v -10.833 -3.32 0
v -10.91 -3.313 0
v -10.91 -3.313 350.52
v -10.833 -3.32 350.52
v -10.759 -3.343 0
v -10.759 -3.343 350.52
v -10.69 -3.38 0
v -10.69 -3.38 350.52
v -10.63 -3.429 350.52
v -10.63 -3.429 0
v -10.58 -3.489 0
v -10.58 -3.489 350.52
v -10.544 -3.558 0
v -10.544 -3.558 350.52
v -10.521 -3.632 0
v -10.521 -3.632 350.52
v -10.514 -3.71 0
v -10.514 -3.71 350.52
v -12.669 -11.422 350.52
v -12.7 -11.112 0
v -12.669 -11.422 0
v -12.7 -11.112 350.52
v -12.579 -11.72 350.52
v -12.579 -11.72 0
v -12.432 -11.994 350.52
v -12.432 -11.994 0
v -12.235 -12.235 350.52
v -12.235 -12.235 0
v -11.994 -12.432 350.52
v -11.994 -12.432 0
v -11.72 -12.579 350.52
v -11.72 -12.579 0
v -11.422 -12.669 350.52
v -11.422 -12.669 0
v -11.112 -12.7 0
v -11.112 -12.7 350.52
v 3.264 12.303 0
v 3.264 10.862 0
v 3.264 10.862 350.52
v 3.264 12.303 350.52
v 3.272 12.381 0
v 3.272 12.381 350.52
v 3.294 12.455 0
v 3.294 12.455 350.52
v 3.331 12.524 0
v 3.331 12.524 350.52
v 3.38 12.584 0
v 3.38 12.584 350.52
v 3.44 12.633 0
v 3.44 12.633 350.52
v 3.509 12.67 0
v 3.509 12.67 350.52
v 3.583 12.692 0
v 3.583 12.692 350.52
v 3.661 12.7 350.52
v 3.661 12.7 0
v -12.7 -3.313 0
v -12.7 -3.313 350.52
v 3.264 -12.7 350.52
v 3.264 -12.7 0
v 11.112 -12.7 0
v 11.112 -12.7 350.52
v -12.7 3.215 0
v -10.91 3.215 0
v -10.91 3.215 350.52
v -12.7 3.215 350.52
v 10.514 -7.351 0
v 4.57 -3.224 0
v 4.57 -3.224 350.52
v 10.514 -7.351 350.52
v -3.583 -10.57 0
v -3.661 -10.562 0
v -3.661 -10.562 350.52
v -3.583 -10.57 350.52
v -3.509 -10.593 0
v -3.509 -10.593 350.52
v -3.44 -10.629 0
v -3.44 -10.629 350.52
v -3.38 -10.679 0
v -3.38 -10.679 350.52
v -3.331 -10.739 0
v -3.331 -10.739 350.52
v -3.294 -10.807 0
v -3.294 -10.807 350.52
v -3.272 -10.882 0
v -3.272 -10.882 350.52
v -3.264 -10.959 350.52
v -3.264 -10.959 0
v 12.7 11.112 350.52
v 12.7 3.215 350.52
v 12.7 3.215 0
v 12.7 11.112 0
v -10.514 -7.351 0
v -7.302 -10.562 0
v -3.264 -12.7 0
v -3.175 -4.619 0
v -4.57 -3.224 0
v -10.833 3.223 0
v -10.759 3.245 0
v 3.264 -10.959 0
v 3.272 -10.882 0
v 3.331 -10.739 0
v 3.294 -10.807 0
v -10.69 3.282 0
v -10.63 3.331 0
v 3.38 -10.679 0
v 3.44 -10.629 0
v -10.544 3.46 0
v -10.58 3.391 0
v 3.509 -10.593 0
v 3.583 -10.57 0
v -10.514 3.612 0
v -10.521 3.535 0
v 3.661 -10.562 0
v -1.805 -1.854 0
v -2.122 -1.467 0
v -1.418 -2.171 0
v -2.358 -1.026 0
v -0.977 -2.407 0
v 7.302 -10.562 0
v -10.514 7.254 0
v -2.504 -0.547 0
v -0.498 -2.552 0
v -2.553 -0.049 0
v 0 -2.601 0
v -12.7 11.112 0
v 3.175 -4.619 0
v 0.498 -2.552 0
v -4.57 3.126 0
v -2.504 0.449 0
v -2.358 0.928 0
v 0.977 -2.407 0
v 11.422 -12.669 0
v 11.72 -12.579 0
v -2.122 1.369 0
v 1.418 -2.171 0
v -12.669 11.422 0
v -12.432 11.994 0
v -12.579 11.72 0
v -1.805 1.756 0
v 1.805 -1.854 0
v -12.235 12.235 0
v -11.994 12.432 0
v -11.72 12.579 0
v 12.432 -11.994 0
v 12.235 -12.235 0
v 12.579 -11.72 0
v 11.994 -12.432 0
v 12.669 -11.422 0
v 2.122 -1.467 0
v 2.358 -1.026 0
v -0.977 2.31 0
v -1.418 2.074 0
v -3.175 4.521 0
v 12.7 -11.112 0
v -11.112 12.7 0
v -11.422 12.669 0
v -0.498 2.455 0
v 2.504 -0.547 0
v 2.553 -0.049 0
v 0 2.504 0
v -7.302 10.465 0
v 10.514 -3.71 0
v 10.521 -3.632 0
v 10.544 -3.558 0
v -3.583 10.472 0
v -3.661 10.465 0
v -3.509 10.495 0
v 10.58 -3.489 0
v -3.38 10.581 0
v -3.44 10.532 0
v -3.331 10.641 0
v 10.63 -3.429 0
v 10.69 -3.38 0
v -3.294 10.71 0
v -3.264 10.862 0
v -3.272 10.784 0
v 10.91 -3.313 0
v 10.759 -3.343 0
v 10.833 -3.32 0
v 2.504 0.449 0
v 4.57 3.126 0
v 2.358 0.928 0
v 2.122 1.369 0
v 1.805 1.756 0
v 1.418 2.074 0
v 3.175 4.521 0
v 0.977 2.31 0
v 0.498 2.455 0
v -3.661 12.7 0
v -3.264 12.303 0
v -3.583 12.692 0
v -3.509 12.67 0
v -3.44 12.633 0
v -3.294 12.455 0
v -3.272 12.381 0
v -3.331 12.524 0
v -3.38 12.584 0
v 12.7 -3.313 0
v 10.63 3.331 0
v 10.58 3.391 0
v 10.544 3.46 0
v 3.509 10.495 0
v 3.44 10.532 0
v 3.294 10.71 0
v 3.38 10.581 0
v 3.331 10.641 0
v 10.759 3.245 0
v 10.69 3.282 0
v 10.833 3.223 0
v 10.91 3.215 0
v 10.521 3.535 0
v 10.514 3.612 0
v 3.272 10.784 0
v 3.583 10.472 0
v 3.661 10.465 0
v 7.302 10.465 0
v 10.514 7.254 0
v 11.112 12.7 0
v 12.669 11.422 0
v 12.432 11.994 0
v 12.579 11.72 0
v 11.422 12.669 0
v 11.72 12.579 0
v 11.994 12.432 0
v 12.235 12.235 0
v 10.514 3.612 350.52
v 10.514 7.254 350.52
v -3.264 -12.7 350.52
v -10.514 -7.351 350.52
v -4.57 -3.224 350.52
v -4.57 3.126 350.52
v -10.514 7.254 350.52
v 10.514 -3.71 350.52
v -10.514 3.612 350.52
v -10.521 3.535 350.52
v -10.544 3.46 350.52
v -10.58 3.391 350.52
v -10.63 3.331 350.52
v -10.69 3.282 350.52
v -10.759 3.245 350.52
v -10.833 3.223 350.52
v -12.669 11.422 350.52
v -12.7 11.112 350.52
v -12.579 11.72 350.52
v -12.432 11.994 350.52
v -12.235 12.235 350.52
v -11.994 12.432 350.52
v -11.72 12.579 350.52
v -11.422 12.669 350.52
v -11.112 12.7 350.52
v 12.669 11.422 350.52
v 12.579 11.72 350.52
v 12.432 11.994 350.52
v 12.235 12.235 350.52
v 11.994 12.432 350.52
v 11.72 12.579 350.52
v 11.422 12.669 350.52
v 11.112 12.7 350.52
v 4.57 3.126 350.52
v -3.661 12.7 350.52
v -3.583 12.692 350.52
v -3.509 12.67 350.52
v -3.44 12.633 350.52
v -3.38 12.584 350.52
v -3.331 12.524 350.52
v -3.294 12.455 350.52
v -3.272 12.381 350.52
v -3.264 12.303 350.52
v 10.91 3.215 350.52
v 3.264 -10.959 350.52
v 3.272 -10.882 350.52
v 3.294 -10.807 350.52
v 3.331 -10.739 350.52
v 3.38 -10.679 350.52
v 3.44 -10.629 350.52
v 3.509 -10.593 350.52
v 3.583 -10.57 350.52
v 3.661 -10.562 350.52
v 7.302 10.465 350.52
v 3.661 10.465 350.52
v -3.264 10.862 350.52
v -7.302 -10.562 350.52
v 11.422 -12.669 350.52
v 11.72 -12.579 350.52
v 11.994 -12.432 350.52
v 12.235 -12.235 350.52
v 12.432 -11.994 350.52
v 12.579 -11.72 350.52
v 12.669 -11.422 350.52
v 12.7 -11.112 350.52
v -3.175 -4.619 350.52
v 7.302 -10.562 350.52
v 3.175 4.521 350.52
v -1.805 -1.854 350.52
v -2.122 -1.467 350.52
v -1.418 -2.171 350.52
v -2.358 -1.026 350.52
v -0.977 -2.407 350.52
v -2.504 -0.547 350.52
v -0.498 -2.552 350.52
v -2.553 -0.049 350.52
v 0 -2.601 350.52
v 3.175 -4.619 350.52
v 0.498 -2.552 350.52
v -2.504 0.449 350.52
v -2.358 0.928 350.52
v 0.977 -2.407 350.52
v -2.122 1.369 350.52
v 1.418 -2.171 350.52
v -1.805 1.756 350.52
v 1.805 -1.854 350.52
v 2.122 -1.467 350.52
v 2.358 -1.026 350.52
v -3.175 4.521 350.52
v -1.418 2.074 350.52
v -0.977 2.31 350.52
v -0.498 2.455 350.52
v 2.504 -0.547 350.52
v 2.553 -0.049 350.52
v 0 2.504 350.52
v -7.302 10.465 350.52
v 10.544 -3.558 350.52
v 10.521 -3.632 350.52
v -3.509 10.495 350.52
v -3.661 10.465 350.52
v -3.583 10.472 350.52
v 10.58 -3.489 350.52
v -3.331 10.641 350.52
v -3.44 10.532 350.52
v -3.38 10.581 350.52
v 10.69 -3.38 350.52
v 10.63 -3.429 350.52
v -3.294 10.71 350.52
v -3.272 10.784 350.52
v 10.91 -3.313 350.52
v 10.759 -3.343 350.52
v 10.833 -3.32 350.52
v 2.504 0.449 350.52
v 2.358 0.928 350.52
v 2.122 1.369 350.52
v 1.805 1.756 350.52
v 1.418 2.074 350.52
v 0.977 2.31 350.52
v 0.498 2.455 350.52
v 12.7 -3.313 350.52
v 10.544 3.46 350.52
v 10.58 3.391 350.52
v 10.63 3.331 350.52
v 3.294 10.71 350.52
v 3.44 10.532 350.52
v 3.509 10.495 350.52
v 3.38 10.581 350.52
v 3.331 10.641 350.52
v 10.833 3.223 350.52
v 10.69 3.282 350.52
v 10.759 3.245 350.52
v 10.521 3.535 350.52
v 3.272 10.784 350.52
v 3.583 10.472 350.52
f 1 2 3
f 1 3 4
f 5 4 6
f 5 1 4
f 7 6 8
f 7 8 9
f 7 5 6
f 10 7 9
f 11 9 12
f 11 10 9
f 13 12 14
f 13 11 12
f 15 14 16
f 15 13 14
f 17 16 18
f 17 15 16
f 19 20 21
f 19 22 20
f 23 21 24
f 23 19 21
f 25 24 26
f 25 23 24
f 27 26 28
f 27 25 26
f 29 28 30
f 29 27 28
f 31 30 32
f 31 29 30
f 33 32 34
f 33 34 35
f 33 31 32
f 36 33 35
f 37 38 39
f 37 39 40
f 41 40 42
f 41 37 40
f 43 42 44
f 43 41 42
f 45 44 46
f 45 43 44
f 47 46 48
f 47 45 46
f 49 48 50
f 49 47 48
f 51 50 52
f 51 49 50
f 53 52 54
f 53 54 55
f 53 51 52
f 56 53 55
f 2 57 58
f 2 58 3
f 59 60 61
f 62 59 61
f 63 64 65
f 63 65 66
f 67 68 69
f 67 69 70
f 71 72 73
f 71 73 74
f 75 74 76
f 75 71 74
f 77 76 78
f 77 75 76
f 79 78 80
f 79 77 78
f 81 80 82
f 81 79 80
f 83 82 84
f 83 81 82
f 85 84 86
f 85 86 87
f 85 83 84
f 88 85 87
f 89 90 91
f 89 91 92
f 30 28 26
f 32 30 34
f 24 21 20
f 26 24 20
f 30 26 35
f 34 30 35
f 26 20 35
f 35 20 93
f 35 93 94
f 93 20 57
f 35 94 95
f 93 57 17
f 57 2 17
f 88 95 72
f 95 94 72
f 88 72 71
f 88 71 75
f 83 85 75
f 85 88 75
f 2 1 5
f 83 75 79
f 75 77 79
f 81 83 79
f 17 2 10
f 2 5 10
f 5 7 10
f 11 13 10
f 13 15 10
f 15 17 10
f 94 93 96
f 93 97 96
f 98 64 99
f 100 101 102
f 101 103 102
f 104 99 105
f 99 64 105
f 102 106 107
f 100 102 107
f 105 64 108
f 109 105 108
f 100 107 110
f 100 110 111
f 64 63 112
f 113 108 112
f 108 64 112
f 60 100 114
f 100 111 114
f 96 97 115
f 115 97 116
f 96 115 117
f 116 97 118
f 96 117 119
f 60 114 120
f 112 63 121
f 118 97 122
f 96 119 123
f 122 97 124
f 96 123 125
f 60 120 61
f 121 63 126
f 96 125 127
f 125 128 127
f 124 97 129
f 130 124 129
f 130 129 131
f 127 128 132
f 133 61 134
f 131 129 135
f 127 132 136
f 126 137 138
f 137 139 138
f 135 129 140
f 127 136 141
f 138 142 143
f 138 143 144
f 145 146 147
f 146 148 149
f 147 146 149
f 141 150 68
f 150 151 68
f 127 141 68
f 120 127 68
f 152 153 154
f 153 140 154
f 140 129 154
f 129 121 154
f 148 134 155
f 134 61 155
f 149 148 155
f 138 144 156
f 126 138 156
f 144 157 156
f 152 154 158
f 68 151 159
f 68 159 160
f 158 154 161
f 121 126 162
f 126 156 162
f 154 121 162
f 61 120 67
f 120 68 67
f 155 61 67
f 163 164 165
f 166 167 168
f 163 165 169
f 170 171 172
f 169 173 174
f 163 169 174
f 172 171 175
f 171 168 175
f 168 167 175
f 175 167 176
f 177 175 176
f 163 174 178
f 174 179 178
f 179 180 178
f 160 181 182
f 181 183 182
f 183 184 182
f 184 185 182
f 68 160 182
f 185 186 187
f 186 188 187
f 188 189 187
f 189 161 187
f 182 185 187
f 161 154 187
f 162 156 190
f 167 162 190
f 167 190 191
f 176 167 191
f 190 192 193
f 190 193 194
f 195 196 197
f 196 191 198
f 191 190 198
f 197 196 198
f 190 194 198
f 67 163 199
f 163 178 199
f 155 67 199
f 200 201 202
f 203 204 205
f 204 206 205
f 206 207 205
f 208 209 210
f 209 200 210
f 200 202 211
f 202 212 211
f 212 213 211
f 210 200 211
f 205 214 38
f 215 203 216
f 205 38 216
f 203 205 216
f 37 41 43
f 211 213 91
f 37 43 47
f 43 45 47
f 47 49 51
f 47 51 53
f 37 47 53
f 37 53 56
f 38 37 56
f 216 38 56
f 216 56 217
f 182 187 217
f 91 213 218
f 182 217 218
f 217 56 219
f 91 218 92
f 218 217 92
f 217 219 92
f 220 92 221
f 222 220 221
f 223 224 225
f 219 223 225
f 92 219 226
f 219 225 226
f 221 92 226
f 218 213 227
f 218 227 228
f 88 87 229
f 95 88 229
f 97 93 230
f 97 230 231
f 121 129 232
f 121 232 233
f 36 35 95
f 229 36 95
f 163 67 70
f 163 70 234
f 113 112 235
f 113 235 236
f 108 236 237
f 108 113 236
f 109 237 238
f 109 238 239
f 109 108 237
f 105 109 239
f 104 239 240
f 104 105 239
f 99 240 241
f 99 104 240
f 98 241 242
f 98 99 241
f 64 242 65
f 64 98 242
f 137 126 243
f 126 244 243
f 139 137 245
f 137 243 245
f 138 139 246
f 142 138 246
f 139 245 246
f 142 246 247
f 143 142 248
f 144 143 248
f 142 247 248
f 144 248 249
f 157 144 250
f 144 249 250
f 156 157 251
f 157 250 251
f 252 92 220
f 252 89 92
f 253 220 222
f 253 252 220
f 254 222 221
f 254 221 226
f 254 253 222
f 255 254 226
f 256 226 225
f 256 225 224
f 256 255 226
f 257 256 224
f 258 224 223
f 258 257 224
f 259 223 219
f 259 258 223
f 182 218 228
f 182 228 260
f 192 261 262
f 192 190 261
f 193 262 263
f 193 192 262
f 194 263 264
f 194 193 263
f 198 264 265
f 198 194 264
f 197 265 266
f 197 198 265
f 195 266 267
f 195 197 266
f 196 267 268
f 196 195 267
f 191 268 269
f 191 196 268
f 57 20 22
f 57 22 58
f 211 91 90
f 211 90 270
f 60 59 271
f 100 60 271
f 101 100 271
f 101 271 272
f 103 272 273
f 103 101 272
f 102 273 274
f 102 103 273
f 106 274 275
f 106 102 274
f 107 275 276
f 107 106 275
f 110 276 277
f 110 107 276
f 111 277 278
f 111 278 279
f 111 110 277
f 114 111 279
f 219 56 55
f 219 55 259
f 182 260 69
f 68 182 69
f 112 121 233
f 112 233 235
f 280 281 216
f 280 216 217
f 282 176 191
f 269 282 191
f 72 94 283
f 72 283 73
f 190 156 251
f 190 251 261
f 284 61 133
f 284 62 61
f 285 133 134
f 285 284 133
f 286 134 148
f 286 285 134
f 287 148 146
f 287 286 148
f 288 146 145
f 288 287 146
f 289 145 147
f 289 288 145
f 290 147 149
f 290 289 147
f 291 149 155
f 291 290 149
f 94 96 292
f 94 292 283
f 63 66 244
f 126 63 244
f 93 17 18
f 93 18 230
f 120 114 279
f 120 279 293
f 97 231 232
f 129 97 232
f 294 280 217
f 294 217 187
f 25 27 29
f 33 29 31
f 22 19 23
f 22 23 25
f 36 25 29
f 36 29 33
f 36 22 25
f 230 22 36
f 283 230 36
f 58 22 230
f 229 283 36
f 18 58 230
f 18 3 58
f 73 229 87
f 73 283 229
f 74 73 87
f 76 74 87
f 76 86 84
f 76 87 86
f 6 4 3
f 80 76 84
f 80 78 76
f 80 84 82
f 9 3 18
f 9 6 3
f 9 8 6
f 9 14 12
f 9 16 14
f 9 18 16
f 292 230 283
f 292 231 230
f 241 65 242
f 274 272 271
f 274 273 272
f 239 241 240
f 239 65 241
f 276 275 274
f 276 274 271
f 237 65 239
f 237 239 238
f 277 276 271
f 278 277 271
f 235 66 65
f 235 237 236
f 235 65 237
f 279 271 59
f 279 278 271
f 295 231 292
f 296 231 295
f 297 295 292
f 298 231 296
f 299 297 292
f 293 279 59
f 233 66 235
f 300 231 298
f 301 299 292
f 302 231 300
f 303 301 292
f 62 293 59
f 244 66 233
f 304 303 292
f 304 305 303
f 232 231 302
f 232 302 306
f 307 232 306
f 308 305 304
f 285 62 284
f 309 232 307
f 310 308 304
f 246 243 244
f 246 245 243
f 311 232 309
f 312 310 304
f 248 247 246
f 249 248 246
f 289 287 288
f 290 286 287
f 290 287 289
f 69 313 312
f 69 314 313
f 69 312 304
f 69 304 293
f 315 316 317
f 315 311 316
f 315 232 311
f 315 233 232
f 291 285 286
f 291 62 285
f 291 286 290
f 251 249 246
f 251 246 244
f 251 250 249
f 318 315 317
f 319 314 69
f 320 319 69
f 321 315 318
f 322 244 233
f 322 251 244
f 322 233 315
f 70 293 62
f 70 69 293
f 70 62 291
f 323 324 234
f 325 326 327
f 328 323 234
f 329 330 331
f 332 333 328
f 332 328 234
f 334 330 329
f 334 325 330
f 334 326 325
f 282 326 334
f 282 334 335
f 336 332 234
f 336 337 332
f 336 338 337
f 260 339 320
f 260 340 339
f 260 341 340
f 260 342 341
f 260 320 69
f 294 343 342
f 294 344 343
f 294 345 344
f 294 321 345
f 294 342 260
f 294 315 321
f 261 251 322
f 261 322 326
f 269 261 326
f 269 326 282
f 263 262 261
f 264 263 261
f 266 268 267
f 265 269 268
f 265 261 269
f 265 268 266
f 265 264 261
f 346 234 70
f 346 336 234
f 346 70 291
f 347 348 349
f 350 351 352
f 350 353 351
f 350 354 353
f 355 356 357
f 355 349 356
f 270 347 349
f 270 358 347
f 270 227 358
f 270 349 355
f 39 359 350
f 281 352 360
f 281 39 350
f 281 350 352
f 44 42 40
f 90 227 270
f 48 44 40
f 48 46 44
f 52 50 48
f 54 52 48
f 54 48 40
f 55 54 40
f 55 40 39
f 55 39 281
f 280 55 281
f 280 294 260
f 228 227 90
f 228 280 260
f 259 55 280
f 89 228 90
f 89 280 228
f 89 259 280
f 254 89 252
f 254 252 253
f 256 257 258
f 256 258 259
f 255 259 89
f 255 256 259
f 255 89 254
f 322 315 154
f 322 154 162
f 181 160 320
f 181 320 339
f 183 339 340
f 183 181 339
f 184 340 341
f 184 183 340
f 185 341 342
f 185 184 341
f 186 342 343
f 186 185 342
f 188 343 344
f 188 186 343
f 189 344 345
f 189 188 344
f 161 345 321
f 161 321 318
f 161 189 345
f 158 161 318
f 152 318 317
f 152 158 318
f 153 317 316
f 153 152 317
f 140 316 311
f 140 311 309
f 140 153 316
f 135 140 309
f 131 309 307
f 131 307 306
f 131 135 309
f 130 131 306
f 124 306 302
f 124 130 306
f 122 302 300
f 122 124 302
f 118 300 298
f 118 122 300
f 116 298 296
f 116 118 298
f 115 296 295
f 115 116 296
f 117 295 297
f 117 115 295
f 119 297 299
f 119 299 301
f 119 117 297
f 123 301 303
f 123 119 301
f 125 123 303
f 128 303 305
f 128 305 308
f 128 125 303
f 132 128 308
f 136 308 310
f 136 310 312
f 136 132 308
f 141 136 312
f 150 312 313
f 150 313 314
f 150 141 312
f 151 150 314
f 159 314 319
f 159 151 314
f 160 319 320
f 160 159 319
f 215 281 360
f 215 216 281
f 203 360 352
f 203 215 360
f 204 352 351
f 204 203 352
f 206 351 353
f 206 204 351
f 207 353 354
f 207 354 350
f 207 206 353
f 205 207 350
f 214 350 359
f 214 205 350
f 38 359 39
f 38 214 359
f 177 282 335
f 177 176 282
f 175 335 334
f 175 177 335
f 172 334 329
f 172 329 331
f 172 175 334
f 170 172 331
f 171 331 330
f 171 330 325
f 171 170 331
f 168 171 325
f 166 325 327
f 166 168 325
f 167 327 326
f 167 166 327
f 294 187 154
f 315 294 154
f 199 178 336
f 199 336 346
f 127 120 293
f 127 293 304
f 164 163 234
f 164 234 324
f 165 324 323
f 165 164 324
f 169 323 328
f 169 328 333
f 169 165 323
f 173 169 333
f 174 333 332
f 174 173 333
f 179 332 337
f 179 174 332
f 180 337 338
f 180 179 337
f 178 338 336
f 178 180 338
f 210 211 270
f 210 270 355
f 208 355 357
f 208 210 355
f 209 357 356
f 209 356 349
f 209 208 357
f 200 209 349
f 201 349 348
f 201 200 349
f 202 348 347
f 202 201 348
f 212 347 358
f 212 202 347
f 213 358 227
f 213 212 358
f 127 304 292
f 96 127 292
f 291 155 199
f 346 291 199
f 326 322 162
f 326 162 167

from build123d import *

# Parameters (mm, degrees)
SKETCH1_W           = 25.4
SKETCH1_H           = 25.4
BOSS_EXTRUDE1_DEPTH = 350.52
FILLET1_R           = 1.5875
HOLE1_OUTLINE_R     = 2.5527
HOLE1_DEPTH         = 350.52
SKETCH7_W           = 6.5278
SKETCH7_H           = 2.2352
CUT_EXTRUDE2_DEPTH  = 350.52
FILLET4_R           = 0.396875
CIRPATTERN2_DEPTH   = 350.52


# Read off the part's stored shape, not the designer's step: Hole1, CirPattern2
with BuildPart() as part:
    # Sketch1 → Boss-Extrude1 (new body)
    with BuildSketch(Plane.XY):
        Rectangle(SKETCH1_W, SKETCH1_H)
    extrude(amount=BOSS_EXTRUDE1_DEPTH)

    # Fillet1
    fillet1_edges = [part.edges().sort_by_distance(p)[0] for p in [
        (12.7, -12.7, 175.26),
        (-12.7, -12.7, 175.26),
        (-12.7, 12.7, 175.26),
        (12.7, 12.7, 175.26),
    ]]
    fillet(fillet1_edges, radius=FILLET1_R)

    # Hole1 outline → Hole1 (cut)
    with BuildSketch(Plane.XY):
        with Locations((0, -0.048792482)):
            Circle(HOLE1_OUTLINE_R)
    extrude(amount=HOLE1_DEPTH, mode=Mode.SUBTRACT)

    # Sketch7 → Cut-Extrude2 (cut)
    with BuildSketch(Plane.XY.offset(350.52)):
        with Locations((0, 11.5824)):
            Rectangle(SKETCH7_W, SKETCH7_H)
        Polygon((-3.175, 4.5212), (-7.3025, 10.4648), (7.3025, 10.4648), (3.175, 4.5212), align=None)
    extrude(amount=-CUT_EXTRUDE2_DEPTH, mode=Mode.SUBTRACT)

    # Fillet4
    fillet4_edges = [part.edges().sort_by_distance(p)[0] for p in [
        (-3.2639, 10.4648, 175.26),
        (-3.2639, 12.7, 175.26),
        (3.2639, 12.7, 175.26),
        (3.2639, 10.4648, 175.26),
    ]]
    fillet(fillet4_edges, radius=FILLET4_R)

    # CirPattern2 outline → CirPattern2 (cut)
    with BuildSketch(Plane.XY):
        with BuildLine():
            ThreePointArc((-3.660775, -10.562384964), (-3.380141996, -10.67862696), (-3.2639, -10.959259964))
            Line((-3.2639, -10.959259964), (-3.2639, -12.7))
            Line((-3.2639, -12.7), (3.2639, -12.7))
            Line((3.2639, -12.7), (3.2639, -10.959259964))
            ThreePointArc((3.2639, -10.959259964), (3.380141996, -10.67862696), (3.660775, -10.562384964))
            Line((3.660775, -10.562384964), (7.3025, -10.562384964))
            Line((7.3025, -10.562384964), (3.175, -4.618784964))
            Line((3.175, -4.618784964), (-3.175, -4.618784964))
            Line((-3.175, -4.618784964), (-7.3025, -10.562384964))
            Line((-7.3025, -10.562384964), (-3.660775, -10.562384964))
        make_face()
        with BuildLine():
            Line((-12.7, -3.312692482), (-10.910467482, -3.312692482))
            ThreePointArc((-10.910467482, -3.312692482), (-10.629834478, -3.428934478), (-10.513592482, -3.709567482))
            Line((-10.513592482, -3.709567482), (-10.513592482, -7.351292482))
            Line((-10.513592482, -7.351292482), (-4.569992482, -3.223792482))
            Line((-4.569992482, -3.223792482), (-4.569992482, 3.126207518))
            Line((-4.569992482, 3.126207518), (-10.513592482, 7.253707518))
            Line((-10.513592482, 7.253707518), (-10.513592482, 3.611982518))
            ThreePointArc((-10.513592482, 3.611982518), (-10.629834478, 3.331349514), (-10.910467482, 3.215107518))
            Line((-10.910467482, 3.215107518), (-12.7, 3.215107518))
            Line((-12.7, 3.215107518), (-12.7, -3.312692482))
        make_face()
        with BuildLine():
            ThreePointArc((10.513592482, -3.709567482), (10.629834478, -3.428934478), (10.910467482, -3.312692482))
            Line((10.910467482, -3.312692482), (12.7, -3.312692482))
            Line((12.7, -3.312692482), (12.7, 3.215107518))
            Line((12.7, 3.215107518), (10.910467482, 3.215107518))
            ThreePointArc((10.910467482, 3.215107518), (10.629834478, 3.331349514), (10.513592482, 3.611982518))
            Line((10.513592482, 3.611982518), (10.513592482, 7.253707518))
            Line((10.513592482, 7.253707518), (4.569992482, 3.126207518))
            Line((4.569992482, 3.126207518), (4.569992482, -3.223792482))
            Line((4.569992482, -3.223792482), (10.513592482, -7.351292482))
            Line((10.513592482, -7.351292482), (10.513592482, -3.709567482))
        make_face()
    extrude(amount=CIRPATTERN2_DEPTH, mode=Mode.SUBTRACT)


solid = part.part
